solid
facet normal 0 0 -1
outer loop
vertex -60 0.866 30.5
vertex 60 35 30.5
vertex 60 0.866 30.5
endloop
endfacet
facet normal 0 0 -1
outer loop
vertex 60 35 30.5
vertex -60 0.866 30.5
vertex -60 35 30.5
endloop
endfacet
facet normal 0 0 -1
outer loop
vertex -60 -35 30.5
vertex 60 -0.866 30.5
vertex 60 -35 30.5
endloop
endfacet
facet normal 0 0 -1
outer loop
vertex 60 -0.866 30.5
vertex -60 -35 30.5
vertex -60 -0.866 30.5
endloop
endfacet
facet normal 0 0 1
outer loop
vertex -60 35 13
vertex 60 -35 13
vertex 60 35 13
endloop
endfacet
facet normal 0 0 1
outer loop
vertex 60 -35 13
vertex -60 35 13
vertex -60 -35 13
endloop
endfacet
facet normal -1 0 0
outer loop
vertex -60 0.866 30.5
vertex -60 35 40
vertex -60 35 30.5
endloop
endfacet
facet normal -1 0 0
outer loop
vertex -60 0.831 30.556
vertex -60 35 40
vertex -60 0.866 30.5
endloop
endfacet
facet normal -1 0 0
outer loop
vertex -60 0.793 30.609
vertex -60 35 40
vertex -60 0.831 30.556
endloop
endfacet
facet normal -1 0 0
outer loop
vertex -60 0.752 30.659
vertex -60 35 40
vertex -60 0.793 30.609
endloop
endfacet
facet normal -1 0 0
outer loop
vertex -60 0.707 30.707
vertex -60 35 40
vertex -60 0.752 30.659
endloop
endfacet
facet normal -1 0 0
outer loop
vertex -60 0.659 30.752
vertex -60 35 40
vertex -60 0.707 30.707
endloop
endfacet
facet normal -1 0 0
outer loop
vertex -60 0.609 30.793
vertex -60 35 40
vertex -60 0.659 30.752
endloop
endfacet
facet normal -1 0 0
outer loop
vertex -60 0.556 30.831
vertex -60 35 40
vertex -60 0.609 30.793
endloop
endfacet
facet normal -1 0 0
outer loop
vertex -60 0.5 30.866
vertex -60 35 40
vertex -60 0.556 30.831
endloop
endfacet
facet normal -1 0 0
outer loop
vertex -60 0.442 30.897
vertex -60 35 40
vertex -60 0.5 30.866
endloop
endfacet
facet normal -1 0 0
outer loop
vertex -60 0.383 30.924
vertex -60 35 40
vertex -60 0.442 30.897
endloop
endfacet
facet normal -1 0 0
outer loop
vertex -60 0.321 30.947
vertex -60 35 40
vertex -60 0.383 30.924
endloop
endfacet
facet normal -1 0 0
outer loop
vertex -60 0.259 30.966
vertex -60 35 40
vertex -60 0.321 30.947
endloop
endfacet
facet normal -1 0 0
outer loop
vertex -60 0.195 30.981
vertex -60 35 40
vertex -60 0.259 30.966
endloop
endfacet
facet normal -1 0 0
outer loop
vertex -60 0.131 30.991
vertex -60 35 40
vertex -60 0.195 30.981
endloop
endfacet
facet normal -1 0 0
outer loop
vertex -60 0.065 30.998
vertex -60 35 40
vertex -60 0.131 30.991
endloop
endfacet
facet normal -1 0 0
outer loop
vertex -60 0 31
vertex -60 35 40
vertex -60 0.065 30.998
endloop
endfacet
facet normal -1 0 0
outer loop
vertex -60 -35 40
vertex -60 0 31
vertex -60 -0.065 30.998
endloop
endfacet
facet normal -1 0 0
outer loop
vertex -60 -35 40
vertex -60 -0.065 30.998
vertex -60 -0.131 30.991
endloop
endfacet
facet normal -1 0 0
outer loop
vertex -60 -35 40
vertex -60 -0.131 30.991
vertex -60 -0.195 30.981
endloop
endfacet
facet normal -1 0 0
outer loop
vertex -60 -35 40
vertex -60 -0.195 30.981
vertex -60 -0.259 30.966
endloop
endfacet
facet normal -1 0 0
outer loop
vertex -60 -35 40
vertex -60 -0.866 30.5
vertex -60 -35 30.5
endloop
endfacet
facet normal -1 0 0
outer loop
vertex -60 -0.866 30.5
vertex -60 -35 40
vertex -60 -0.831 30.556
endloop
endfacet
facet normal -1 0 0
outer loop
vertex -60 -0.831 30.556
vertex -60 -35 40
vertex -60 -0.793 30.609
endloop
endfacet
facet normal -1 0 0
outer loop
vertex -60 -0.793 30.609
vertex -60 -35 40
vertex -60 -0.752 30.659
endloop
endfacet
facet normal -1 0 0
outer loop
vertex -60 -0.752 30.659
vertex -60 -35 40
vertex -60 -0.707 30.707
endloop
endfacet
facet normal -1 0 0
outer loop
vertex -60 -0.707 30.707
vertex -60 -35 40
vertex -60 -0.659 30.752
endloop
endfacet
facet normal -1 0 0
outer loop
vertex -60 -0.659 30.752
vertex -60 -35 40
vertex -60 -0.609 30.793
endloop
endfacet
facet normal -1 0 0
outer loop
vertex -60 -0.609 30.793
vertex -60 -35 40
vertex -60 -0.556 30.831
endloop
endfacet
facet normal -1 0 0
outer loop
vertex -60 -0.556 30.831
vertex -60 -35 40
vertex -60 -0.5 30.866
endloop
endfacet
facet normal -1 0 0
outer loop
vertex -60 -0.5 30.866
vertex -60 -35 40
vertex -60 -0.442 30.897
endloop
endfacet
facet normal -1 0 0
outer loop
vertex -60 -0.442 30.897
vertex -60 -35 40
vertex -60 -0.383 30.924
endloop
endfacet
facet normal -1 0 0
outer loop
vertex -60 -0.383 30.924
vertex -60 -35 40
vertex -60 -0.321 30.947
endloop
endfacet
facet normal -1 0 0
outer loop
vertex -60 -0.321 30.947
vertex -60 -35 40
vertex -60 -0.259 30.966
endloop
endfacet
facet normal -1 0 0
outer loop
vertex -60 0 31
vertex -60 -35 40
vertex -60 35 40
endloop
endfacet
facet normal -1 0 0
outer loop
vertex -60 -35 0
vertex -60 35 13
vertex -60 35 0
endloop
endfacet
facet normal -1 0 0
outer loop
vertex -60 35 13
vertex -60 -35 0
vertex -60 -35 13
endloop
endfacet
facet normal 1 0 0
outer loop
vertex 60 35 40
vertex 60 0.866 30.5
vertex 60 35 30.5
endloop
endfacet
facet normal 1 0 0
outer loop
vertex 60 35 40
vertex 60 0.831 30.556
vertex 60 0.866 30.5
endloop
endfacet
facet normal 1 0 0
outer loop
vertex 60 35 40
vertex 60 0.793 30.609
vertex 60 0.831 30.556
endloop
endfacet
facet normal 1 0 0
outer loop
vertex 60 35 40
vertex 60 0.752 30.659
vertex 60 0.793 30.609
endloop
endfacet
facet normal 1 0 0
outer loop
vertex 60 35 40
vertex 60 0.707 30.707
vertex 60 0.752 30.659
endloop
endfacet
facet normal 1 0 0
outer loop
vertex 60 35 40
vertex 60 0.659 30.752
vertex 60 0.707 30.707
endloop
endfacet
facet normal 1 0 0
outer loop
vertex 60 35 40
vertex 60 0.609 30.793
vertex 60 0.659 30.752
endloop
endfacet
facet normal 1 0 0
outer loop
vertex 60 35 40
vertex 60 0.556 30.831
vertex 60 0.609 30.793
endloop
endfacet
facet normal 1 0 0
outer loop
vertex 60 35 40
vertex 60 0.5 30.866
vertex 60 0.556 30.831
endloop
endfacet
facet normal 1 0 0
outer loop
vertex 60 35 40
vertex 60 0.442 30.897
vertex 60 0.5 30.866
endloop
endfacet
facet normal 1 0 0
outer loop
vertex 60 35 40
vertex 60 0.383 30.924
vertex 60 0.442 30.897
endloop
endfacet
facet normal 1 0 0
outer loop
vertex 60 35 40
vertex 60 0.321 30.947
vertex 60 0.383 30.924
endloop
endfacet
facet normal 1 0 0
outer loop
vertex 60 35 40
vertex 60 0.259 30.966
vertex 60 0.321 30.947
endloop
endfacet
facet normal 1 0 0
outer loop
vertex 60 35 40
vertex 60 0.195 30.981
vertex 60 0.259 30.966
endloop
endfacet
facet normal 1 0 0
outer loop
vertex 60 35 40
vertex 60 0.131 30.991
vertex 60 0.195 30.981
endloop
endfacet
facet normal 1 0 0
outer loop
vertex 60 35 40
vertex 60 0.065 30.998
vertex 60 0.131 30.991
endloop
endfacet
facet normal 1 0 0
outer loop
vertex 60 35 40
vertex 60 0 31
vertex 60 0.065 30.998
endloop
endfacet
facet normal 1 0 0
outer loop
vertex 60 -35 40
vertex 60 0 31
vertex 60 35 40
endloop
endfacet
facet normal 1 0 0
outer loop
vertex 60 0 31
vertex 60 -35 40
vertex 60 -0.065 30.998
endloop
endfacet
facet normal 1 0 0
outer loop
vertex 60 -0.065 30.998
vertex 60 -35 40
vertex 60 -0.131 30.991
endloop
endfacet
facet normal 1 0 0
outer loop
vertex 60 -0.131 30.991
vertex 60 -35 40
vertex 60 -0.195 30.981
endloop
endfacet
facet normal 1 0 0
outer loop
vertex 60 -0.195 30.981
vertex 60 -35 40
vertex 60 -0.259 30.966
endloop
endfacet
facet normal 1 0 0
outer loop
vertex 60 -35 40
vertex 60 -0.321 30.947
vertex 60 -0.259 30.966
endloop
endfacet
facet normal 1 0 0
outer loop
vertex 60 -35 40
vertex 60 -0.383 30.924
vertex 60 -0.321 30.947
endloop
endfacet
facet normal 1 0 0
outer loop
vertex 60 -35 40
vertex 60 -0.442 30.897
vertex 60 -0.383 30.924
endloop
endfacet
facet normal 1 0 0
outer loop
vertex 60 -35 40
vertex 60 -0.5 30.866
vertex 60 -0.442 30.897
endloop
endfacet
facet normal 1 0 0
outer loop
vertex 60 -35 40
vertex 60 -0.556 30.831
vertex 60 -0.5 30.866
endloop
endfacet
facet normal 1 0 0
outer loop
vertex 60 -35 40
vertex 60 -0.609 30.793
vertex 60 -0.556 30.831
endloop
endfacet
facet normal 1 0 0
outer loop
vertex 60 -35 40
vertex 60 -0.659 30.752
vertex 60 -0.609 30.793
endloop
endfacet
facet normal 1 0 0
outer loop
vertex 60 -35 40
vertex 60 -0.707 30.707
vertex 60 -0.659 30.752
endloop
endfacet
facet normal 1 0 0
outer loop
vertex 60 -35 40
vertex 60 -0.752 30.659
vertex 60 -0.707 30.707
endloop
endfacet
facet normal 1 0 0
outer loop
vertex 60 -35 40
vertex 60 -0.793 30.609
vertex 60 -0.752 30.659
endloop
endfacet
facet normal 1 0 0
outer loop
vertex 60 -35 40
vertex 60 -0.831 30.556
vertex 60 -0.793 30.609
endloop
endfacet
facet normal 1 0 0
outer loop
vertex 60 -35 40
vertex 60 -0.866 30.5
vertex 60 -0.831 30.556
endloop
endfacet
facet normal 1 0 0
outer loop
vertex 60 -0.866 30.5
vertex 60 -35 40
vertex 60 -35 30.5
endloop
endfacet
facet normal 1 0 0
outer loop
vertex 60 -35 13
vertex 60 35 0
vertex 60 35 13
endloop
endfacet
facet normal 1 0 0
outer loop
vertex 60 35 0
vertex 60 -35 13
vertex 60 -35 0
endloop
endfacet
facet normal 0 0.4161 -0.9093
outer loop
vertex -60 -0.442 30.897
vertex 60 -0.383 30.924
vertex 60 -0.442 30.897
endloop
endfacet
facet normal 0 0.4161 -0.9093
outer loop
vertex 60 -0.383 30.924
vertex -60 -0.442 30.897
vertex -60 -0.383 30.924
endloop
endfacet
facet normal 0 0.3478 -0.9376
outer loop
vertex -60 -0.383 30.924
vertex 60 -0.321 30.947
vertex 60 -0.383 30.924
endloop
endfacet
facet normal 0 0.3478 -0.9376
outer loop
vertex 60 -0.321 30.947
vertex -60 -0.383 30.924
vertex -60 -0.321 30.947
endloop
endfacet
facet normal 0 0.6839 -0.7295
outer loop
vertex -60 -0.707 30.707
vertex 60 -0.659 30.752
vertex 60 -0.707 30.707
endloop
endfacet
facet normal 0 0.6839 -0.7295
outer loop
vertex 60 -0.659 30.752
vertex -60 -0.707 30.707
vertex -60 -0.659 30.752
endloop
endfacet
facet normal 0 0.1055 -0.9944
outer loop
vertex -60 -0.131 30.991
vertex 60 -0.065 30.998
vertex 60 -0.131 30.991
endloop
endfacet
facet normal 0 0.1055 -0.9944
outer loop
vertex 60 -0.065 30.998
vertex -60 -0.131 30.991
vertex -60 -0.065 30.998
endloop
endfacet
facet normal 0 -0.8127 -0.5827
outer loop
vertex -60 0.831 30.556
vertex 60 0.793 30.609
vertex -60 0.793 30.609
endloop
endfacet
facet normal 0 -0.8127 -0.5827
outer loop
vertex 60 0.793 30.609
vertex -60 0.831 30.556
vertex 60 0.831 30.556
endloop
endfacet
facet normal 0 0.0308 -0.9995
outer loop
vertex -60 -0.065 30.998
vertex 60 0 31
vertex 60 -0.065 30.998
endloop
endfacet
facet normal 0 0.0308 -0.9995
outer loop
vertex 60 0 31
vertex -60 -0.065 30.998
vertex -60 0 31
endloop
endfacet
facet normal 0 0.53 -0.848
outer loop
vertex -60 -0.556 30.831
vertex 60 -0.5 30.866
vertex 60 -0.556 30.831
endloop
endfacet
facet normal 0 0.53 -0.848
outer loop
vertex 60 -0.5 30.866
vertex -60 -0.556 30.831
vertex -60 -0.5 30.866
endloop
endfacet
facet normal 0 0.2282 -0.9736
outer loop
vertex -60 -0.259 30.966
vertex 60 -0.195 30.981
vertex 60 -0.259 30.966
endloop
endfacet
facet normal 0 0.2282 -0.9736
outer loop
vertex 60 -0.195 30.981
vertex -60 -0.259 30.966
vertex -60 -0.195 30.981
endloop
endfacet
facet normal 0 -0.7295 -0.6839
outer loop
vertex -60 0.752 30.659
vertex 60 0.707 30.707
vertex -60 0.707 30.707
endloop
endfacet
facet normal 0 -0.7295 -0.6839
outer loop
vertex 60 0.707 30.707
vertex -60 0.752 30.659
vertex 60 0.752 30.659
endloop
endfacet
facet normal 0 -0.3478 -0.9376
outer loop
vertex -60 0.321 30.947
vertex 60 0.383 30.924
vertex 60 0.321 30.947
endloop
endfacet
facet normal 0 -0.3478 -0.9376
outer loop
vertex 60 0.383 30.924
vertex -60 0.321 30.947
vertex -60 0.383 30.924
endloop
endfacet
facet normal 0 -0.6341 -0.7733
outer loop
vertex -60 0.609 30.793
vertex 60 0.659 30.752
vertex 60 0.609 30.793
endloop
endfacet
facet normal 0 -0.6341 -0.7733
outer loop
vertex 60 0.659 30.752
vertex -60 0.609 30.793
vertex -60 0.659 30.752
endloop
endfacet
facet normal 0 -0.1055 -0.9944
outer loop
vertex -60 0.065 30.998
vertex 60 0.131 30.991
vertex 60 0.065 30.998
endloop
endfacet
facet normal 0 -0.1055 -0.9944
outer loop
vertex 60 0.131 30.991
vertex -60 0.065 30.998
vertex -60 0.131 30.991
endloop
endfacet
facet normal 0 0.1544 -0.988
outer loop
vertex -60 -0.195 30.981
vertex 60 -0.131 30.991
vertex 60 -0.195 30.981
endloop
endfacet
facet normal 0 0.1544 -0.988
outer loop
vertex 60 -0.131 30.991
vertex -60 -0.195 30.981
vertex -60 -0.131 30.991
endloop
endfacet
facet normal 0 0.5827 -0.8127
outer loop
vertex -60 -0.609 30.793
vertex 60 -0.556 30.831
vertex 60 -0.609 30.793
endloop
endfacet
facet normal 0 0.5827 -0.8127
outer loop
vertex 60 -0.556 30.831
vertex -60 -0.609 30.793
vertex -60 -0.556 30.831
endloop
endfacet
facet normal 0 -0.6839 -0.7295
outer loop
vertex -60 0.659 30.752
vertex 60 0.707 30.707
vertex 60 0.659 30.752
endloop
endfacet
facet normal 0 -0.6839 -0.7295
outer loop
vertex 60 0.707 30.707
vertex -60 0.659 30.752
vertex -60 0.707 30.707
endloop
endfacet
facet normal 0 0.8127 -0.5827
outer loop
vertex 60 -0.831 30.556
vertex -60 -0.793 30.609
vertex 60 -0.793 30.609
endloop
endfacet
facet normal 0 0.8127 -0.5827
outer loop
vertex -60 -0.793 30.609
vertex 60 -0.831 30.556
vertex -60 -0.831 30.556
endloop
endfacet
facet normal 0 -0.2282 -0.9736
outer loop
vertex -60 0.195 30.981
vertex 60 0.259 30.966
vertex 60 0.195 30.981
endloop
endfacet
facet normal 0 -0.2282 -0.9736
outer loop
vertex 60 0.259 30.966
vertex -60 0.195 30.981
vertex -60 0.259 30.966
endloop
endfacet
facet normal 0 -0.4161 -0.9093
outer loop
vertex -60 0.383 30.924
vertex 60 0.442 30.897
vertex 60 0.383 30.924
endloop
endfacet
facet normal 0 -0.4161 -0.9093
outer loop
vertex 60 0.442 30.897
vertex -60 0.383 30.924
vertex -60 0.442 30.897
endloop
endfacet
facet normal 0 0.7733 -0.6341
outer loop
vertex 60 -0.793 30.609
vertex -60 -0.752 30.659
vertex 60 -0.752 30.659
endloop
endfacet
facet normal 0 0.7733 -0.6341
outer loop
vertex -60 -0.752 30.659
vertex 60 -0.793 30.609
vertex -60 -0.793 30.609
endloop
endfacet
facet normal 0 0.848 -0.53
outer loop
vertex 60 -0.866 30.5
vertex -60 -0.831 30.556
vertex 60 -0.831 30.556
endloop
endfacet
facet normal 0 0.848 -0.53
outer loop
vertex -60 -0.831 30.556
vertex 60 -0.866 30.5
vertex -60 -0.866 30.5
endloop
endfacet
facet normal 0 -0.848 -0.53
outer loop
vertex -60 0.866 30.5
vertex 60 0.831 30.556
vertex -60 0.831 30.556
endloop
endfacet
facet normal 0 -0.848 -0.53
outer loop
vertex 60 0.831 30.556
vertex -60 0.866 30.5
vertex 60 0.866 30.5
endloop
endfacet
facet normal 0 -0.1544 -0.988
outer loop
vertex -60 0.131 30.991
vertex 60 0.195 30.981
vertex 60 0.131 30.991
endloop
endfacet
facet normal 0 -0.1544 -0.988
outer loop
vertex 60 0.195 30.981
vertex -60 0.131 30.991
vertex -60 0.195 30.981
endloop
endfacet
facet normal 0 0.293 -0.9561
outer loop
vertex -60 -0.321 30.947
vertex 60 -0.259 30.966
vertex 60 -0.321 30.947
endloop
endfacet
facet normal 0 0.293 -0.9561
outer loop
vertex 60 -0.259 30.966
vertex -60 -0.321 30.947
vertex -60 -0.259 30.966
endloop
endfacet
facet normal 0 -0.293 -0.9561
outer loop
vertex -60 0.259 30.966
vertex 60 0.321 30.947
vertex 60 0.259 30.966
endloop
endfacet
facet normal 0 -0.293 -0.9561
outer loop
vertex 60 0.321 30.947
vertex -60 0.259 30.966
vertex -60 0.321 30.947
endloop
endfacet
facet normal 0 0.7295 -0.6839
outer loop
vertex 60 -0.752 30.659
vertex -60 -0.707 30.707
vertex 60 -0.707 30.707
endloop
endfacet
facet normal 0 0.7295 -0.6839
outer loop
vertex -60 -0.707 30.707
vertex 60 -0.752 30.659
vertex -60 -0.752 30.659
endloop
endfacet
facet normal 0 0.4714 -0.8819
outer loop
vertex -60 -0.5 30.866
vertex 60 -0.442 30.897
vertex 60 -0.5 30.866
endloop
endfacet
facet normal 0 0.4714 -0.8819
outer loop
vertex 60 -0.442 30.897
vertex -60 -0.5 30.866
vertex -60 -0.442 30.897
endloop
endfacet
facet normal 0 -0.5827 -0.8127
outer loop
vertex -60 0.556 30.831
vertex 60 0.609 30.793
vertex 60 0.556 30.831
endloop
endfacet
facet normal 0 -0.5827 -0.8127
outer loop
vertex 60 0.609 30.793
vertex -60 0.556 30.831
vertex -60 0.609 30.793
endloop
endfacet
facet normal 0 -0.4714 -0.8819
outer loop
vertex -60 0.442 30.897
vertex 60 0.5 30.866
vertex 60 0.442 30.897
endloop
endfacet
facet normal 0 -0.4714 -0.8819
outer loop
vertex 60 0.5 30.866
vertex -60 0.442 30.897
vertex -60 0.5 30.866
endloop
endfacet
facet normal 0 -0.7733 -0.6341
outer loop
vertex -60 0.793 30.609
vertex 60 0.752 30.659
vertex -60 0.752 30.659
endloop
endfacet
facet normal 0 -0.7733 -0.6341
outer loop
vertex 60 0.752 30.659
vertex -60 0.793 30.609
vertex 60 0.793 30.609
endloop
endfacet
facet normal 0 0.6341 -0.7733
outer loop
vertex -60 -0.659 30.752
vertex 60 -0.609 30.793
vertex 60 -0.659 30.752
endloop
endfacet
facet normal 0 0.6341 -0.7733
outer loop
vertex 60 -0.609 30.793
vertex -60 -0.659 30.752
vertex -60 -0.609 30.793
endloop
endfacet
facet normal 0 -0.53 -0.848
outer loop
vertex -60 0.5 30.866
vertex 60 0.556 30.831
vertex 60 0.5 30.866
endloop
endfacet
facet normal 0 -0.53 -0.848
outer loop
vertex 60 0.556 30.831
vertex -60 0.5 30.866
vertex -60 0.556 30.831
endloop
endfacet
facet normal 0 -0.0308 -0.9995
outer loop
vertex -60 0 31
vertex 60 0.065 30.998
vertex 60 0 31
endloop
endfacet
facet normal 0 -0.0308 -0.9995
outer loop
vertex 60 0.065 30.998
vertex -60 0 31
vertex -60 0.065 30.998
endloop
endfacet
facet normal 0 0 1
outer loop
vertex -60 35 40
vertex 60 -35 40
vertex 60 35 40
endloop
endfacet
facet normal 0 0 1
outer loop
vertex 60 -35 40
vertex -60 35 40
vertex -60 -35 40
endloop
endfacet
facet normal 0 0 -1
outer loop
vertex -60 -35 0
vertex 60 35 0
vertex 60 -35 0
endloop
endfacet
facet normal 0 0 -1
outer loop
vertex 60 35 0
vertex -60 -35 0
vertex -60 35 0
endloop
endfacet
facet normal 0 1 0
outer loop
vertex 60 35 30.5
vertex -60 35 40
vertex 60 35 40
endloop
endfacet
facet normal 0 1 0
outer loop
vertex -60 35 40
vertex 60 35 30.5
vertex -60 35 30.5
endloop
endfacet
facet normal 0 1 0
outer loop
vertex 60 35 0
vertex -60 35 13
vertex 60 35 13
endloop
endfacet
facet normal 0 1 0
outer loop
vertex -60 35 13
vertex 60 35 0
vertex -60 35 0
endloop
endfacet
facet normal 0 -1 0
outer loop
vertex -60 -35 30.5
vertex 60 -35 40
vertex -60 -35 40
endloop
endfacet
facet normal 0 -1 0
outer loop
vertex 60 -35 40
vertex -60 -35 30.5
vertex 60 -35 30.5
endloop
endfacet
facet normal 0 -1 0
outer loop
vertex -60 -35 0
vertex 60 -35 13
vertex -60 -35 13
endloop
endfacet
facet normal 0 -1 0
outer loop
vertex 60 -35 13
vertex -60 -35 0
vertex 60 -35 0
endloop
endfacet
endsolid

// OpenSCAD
// Mini horizontal gel-electrophoresis box - buffer tank
// Print orientation: tank rests on XY plane at z = 0, builds upward (+Z)

// ---------------- Parameters ----------------
tank_x      = 120;   // outer length in X (mm)
tank_y      = 70;    // outer width in Y (mm)
tank_h      = 40;    // outer height in Z (mm)
wall        = 3;     // wall thickness (mm)
floor       = 3;     // floor thickness (mm)

platform_x  = 60;    // platform length in X (mm), centred
platform_y  = tank_y - 2 * wall;  // platform spans full inner width
platform_top = 10;   // platform top height above inner floor (mm) -> z = 13

hole_d      = 2;     // electrode hole diameter (mm)
hole_y      = 0;     // electrode hole Y position (mm)
hole_z      = 30;    // electrode hole Z position (mm)

eps         = 0.5;   // cutter overshoot past faces (mm)
$fn         = 96;    // curve resolution

// ---------------- Derived ----------------
inner_floor_z = floor;
platform_z    = inner_floor_z + platform_top;  // z = 13
chamber_h     = hole_z - platform_z;           // height of buffer chambers above platform

// ---------------- Model ----------------
difference() {
    // Tank body: outer block with floor and walls, open top
    translate([-tank_x/2, -tank_y/2, 0])
        cube([tank_x, tank_y, tank_h]);

    // Cut out the two end buffer chambers above the platform
    for (sx = [-1, 1]) {
        x0 = sx < 0 ? -tank_x/2 : tank_x/2 - platform_x;
        x1 = x0 + platform_x - (sx < 0 ? platform_x : tank_x - platform_x);
        translate([x0, -tank_y/2 - eps, platform_z])
            cube([platform_x, tank_y + 2*eps, chamber_h + eps]);
    }

    // Horizontal electrode holes through each end wall, along X
    for (sx = [-1, 1]) {
        x = sx < 0 ? -tank_x/2 - eps : tank_x/2 + platform_x/2 - eps;
        translate([x, hole_y, hole_z])
            rotate([0, 90, 0])
                cylinder(d = hole_d, h = tank_x + 2*eps);
    }
}
